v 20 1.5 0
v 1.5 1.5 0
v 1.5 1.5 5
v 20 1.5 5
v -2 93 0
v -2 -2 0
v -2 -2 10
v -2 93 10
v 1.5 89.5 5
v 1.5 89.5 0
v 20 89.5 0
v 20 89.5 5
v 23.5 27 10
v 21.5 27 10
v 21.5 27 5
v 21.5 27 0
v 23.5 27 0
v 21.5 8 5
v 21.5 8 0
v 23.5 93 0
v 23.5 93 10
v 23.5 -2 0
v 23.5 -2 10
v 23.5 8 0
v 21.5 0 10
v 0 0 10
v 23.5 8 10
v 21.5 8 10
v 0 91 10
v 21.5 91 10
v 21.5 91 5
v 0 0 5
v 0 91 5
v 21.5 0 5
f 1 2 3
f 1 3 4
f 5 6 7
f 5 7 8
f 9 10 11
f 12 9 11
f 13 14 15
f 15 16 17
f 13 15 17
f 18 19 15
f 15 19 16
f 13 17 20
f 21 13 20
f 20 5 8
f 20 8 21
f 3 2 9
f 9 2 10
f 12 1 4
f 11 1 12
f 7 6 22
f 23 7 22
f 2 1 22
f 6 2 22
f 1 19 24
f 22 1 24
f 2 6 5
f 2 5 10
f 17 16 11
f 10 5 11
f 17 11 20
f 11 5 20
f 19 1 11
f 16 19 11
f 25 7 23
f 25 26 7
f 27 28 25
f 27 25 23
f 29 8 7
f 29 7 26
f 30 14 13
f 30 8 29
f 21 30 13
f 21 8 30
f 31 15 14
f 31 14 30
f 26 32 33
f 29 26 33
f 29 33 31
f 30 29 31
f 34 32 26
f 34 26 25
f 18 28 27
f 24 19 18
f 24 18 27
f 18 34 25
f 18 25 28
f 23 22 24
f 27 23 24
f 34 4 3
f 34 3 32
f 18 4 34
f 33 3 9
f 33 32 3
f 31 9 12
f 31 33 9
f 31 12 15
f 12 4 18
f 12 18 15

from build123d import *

# Parameters (mm, degrees)
BOX015_W     = 25.5
BOX015_H     = 2
BOX015_DEPTH = 10
BOX016_W     = 2
BOX016_H     = 8
BOX016_DEPTH = 10
BOX017_W     = 2
BOX017_H     = 64
BOX017_DEPTH = 10
BOX014_W     = 25.5
BOX014_H     = 2
BOX014_DEPTH = 10
BOX013_W     = 2
BOX013_H     = 91
BOX013_DEPTH = 10
BOX011_W     = 18.5
BOX011_H     = 88
BOX011_DEPTH = 5
BOX010_W     = 21.5
BOX010_H     = 91
BOX010_DEPTH = 5


with BuildPart() as frame_top:
    # Box015 → Box015 (new body)
    with BuildSketch(Plane(origin=(-2, 91, 0), x_dir=(1, 0, 0), z_dir=(0, 0, 1))):
        with Locations((12.75, 1)):
            Rectangle(BOX015_W, BOX015_H)
    extrude(amount=BOX015_DEPTH)


with BuildPart() as frame_right_bottom:
    # Box016 → Box016 (new body)
    with BuildSketch(Plane(origin=(21.5, 0, 0), x_dir=(1, 0, 0), z_dir=(0, 0, 1))):
        with Locations((1, 4)):
            Rectangle(BOX016_W, BOX016_H)
    extrude(amount=BOX016_DEPTH)


with BuildPart() as frame_right_top:
    # Box017 → Box017 (new body)
    with BuildSketch(Plane(origin=(21.5, 27, 0), x_dir=(1, 0, 0), z_dir=(0, 0, 1))):
        with Locations((1, 32)):
            Rectangle(BOX017_W, BOX017_H)
    extrude(amount=BOX017_DEPTH)


with BuildPart() as frame_bottom:
    # Box014 → Box014 (new body)
    with BuildSketch(Plane(origin=(-2, -2, 0), x_dir=(1, 0, 0), z_dir=(0, 0, 1))):
        with Locations((12.75, 1)):
            Rectangle(BOX014_W, BOX014_H)
    extrude(amount=BOX014_DEPTH)


with BuildPart() as frame:
    # Box013 → Box013 (new body)
    with BuildSketch(Plane(origin=(-2, 0, 0), x_dir=(1, 0, 0), z_dir=(0, 0, 1))):
        with Locations((1, 45.5)):
            Rectangle(BOX013_W, BOX013_H)
    extrude(amount=BOX013_DEPTH)

    # Fusion: union frame_bottom
    add(frame_bottom.part)

    # Fusion001: union frame_right_top
    add(frame_right_top.part)

    # Fusion002: union frame_right_bottom
    add(frame_right_bottom.part)

    # Fusion003: union frame_top
    add(frame_top.part)


with BuildPart() as cube005:
    # Box011 → Box011 (new body)
    with BuildSketch(Plane(origin=(1.5, 1.5, 0), x_dir=(1, 0, 0), z_dir=(0, 0, 1))):
        with Locations((9.25, 44)):
            Rectangle(BOX011_W, BOX011_H)
    extrude(amount=BOX011_DEPTH)


with BuildPart() as fusion004:
    # Box010 → Box010 (new body)
    with BuildSketch(Plane.XY):
        with Locations((10.75, 45.5)):
            Rectangle(BOX010_W, BOX010_H)
    extrude(amount=BOX010_DEPTH)

    # Cut006: cut Cube005
    add(cube005.part, mode=Mode.SUBTRACT)

    # Fusion004: union frame
    add(frame.part)


solid = fusion004.part
